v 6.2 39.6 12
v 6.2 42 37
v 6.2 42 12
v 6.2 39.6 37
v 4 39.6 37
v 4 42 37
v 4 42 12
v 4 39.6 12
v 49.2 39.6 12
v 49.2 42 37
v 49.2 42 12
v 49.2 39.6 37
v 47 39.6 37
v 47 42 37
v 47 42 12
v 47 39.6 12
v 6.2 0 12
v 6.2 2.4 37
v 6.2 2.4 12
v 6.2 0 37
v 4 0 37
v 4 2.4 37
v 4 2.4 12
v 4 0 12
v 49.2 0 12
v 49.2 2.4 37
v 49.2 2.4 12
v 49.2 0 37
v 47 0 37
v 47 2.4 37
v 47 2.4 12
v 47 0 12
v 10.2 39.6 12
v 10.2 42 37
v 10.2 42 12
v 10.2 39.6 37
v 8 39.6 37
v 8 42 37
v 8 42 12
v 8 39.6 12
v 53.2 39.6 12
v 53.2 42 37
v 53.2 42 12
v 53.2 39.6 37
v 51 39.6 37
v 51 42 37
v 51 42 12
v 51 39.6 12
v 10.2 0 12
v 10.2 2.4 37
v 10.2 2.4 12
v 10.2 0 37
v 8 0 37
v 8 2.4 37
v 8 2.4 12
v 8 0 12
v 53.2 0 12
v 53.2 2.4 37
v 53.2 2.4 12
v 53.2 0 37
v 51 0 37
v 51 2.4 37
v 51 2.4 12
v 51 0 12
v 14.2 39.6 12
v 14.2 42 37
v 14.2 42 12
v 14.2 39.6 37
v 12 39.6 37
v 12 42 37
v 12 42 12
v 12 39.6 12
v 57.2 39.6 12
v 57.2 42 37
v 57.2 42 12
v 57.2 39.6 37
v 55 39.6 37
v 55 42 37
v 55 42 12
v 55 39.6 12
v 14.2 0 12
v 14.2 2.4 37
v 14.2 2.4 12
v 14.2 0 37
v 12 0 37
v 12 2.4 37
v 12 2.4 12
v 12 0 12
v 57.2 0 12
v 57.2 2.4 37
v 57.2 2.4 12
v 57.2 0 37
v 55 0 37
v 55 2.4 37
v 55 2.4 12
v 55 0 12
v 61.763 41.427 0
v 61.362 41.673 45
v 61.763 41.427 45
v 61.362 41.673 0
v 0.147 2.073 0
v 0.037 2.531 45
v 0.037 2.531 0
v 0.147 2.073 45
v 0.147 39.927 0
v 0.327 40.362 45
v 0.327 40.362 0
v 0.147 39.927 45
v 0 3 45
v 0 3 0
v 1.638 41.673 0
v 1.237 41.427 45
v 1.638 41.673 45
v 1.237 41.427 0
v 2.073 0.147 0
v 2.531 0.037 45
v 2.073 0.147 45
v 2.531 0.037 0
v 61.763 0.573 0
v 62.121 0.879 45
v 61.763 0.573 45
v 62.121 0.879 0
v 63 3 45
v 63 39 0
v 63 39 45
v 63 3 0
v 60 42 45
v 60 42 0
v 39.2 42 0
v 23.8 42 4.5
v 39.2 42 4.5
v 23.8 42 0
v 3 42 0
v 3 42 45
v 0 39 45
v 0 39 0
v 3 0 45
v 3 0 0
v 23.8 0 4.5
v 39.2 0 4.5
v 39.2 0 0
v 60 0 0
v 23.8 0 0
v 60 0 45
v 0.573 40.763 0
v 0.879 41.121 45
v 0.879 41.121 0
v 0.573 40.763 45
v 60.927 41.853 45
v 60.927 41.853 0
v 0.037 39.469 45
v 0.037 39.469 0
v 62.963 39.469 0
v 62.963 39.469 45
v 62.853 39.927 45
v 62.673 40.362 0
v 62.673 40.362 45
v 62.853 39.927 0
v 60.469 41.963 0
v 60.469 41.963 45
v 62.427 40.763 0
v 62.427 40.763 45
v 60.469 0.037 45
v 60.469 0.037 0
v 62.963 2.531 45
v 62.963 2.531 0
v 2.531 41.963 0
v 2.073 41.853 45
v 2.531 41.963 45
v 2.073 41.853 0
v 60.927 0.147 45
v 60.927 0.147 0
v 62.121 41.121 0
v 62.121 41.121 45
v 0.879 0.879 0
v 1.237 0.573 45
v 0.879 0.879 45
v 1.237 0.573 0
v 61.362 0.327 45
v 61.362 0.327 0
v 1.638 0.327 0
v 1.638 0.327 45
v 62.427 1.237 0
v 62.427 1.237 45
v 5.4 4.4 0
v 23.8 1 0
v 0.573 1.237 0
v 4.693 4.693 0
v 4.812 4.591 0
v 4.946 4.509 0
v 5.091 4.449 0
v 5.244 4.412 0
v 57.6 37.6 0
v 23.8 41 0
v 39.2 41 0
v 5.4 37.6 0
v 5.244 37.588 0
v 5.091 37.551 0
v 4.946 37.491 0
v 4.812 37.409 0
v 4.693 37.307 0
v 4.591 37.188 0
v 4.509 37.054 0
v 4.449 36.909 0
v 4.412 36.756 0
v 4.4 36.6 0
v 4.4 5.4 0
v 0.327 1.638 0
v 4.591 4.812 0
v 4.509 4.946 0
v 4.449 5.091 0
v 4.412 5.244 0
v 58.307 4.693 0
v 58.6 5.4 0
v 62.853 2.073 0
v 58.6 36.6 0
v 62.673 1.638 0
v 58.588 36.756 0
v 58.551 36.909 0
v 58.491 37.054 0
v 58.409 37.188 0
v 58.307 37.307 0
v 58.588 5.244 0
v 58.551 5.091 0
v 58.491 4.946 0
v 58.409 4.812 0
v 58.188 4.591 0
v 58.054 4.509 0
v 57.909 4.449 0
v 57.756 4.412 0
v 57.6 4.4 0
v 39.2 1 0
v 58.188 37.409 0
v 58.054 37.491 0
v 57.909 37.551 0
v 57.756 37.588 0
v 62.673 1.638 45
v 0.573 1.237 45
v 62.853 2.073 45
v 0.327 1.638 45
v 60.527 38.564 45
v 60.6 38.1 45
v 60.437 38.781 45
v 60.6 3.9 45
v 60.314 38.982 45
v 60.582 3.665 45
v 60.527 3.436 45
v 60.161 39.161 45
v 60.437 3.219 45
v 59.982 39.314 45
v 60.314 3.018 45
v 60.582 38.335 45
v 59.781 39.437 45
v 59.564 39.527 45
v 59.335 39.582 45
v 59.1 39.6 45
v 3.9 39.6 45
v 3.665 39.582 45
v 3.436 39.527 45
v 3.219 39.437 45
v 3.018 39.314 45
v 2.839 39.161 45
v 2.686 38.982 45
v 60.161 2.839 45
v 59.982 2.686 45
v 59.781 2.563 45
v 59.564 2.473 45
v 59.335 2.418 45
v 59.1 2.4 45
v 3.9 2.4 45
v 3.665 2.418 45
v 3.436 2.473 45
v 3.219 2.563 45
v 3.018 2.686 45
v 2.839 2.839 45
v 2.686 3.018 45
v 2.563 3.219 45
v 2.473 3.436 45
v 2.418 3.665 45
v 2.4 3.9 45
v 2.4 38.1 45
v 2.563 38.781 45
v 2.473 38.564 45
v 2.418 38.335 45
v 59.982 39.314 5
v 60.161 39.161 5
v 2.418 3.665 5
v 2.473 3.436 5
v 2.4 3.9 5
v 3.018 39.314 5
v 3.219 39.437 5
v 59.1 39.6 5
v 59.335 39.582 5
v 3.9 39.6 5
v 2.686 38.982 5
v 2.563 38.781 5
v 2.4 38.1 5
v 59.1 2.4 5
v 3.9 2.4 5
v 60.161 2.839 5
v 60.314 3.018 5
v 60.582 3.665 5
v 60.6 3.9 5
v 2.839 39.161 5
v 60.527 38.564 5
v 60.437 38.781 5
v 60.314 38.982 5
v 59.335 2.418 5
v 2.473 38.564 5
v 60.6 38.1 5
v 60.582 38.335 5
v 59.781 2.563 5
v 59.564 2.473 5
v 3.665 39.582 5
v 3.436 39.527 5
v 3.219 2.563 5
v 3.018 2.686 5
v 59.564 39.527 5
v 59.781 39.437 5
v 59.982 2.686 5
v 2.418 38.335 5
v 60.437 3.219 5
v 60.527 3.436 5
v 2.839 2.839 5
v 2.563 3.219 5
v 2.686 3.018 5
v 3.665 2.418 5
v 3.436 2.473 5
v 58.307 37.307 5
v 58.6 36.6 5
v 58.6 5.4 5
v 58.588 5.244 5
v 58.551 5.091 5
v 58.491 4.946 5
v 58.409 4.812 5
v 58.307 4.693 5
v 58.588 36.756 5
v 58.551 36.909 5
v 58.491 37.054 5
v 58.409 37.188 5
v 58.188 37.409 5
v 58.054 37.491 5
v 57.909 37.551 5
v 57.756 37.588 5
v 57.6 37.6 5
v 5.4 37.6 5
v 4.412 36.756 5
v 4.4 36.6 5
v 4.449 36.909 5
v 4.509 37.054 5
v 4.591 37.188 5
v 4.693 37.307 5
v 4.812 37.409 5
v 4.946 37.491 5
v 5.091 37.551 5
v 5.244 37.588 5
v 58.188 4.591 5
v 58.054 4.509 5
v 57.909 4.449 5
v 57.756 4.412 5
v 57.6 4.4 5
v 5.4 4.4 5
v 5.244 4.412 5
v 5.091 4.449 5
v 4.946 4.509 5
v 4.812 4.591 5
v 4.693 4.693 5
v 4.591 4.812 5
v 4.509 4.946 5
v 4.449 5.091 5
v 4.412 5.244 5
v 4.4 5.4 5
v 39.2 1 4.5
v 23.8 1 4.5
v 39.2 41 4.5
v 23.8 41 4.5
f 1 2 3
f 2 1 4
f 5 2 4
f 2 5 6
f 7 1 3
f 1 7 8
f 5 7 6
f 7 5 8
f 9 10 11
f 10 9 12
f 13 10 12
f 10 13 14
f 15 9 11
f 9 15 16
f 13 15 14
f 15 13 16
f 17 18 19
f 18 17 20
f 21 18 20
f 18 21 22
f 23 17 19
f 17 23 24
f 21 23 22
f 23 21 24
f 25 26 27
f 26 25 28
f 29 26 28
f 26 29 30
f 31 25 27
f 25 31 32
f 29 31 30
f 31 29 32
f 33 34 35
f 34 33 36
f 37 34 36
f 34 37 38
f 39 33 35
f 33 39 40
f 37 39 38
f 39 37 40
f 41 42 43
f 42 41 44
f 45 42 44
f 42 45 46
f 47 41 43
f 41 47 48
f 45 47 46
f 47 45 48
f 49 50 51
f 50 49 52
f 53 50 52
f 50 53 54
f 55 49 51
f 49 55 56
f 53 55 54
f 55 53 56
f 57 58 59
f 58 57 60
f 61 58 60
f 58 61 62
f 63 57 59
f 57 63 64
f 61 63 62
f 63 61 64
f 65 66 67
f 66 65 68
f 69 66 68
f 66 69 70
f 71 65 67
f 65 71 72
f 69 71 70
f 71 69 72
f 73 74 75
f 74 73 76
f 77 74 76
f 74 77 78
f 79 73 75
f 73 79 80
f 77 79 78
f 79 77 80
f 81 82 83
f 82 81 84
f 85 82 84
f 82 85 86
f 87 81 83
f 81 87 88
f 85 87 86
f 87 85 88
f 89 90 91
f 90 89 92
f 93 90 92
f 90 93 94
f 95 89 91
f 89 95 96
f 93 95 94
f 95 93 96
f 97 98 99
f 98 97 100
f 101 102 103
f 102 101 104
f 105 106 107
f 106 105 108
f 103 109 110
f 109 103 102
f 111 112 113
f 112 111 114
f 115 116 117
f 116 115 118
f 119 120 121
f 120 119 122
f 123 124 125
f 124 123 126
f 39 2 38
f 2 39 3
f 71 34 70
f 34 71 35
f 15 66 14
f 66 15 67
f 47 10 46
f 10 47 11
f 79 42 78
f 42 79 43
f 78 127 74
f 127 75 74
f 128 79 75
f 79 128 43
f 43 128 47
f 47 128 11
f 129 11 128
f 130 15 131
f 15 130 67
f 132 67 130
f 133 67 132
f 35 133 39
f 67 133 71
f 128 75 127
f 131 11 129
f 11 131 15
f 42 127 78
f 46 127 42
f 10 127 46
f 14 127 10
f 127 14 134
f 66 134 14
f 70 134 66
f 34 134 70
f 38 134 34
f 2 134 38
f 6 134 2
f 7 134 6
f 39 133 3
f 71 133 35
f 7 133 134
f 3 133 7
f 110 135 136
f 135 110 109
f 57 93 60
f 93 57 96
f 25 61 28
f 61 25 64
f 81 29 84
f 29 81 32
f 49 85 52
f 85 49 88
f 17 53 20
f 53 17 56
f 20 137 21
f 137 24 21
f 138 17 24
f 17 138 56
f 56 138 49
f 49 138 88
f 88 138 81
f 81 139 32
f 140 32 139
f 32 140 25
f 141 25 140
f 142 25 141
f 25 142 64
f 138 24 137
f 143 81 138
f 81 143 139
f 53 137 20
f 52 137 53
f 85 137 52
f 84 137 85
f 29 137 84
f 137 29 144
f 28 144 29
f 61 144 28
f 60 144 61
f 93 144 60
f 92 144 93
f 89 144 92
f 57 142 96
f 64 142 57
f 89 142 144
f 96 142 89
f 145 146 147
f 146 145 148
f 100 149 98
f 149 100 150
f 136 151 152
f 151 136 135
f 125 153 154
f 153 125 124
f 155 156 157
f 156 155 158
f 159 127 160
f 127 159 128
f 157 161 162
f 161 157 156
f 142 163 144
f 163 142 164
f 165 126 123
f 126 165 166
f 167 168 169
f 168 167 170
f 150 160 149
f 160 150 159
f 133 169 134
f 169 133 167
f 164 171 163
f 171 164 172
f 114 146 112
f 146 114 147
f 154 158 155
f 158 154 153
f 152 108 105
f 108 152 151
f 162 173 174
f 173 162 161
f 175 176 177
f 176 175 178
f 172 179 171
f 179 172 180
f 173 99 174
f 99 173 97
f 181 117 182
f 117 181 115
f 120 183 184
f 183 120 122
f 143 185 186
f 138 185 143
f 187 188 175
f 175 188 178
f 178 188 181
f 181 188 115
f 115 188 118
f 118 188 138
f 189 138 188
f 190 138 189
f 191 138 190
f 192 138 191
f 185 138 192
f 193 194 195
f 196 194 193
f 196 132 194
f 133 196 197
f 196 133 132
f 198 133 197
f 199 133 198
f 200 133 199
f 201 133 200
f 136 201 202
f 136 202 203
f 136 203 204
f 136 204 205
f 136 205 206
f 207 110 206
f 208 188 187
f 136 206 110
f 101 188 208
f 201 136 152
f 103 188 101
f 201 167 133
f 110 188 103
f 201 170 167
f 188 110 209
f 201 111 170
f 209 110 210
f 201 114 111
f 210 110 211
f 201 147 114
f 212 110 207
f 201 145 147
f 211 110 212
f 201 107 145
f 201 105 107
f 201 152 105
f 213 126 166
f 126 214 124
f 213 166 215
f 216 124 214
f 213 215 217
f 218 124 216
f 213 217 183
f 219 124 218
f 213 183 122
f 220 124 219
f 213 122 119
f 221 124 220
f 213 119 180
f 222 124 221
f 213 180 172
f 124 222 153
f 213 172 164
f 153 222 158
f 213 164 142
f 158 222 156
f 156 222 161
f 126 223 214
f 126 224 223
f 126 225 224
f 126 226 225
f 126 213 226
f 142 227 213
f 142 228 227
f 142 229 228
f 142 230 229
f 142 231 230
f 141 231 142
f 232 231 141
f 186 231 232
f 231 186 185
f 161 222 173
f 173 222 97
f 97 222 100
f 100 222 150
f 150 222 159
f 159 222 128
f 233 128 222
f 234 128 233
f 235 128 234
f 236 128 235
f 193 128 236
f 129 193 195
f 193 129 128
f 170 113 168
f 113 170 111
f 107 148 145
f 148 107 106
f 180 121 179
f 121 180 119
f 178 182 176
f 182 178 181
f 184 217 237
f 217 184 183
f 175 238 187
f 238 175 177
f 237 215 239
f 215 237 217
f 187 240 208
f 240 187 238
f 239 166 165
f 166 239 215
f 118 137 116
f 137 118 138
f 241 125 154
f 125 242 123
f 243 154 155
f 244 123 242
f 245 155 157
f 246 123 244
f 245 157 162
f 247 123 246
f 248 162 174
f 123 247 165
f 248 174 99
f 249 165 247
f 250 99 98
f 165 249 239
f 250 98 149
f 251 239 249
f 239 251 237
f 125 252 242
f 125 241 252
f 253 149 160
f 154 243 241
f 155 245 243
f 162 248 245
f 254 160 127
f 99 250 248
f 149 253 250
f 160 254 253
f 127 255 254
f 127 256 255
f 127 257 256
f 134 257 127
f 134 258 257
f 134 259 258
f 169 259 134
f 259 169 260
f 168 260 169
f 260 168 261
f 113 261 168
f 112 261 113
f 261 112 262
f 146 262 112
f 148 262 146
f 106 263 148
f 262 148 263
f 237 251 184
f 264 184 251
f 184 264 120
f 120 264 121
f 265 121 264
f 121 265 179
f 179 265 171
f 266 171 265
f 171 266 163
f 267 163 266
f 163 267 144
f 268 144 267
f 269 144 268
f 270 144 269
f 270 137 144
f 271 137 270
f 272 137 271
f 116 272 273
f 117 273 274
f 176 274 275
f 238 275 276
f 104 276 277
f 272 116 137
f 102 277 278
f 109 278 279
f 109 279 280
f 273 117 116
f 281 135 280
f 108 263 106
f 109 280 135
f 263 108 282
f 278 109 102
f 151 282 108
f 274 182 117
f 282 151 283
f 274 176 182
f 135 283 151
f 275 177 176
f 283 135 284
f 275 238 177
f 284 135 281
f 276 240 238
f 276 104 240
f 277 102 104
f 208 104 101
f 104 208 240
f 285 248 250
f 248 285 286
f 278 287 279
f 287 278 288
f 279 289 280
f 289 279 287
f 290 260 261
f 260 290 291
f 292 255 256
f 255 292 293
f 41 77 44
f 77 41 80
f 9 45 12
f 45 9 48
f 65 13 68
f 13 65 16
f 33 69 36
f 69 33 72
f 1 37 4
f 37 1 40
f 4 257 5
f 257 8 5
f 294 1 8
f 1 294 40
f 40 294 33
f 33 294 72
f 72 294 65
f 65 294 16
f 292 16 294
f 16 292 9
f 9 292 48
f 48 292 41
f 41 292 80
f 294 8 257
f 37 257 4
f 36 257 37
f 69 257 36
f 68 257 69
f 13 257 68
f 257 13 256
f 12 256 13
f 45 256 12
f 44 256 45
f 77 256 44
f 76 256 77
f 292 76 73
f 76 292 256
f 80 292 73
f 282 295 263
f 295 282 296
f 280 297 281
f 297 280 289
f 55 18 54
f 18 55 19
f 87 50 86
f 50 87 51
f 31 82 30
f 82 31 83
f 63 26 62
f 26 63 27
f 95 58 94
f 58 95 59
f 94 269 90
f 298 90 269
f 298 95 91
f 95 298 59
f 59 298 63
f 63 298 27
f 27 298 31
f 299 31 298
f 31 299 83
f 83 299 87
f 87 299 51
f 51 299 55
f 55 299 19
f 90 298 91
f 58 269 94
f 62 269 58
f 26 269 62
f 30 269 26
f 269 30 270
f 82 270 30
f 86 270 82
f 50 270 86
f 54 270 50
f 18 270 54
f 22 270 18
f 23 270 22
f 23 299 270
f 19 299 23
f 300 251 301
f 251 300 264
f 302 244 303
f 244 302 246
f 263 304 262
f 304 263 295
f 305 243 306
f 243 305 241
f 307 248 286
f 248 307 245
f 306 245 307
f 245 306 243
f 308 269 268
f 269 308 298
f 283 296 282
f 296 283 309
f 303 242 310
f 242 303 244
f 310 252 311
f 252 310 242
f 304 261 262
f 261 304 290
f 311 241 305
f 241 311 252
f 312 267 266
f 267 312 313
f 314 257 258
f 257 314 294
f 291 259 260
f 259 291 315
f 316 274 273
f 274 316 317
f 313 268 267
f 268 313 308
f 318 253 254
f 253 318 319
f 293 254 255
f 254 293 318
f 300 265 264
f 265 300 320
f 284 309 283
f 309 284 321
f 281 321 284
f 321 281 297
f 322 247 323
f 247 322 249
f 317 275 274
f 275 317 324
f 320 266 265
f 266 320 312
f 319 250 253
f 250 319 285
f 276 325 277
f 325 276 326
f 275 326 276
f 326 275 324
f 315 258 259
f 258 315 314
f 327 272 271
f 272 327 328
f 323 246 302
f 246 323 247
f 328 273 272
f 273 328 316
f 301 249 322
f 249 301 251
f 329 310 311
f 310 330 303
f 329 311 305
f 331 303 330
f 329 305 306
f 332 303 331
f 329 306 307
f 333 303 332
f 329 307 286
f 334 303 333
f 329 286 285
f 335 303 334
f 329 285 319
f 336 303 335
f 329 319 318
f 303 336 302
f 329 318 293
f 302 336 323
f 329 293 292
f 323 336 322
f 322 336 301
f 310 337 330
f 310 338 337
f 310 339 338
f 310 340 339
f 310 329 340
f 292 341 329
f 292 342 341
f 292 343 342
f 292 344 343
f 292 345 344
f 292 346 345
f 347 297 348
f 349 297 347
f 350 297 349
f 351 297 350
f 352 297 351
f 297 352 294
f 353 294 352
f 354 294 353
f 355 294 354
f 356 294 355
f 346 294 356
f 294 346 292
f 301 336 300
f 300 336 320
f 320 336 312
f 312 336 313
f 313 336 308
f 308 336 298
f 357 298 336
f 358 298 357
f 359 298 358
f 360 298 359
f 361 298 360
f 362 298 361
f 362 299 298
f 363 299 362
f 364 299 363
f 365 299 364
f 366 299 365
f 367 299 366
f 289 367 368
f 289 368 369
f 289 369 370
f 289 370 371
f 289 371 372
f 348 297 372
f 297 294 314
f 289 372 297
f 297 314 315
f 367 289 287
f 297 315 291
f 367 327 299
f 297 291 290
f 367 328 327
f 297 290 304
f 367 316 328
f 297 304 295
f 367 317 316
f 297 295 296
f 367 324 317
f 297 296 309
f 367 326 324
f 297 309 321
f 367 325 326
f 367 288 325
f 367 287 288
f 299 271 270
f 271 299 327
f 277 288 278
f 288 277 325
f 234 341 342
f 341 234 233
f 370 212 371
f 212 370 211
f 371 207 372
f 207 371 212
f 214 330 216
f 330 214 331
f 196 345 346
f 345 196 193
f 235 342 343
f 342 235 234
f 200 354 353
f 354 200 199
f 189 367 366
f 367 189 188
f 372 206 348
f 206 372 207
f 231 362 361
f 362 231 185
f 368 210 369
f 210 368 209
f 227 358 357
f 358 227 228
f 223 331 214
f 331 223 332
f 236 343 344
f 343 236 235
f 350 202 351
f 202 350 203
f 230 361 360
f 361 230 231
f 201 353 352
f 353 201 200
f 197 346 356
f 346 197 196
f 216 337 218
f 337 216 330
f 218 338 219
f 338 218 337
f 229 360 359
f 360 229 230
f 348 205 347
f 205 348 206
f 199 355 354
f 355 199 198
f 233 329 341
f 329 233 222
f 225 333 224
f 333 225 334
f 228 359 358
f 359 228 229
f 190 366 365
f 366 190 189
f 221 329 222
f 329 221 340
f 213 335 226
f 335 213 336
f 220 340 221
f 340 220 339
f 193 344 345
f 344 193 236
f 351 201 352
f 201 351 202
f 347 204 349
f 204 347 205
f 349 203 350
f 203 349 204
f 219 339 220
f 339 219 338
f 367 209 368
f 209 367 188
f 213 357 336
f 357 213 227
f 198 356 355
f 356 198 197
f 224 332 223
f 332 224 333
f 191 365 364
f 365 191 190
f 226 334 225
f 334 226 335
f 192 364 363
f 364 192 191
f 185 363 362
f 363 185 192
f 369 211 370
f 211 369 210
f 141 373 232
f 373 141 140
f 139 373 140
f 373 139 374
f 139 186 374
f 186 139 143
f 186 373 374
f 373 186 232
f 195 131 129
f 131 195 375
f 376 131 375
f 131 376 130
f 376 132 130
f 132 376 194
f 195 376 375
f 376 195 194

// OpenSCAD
// ============================================================
// MODULE HORLOGE / INCLINOMÈTRE SUZUKI SAMURAI SJ413
// Pièce 2/2 : CORPS DU BOÎTIER ARRIÈRE — 02_boitier_corps.scad
// Carte : ESP32-S3 avec écran IPS 1.9" intégré (170x320, ST7789)
// ============================================================
// IMPORTANT — repère PARTAGÉ avec 01_facade_samurai.scad :
// (0,0) = coin bas-gauche de la DÉCOUPE DU TABLEAU DE BORD.
// Ce fichier est construit directement dans ce repère (pas de
// débord à soustraire). Les positions des encoches ci-dessous
// utilisent les MÊMES variables "x_patte_trou / largeur_patte /
// longueur_patte" que la façade — gardez-les synchronisées si
// vous modifiez l'une ou l'autre pièce.
// ============================================================

$fn = 40;

// --- Dimensions (doivent rester identiques à celles de la façade) ---
largeur_trou       = 63.0;
hauteur_trou       = 42.0;
profondeur_boitier = 45.0;
epaisseur_paroi    = 2.4;

// --- Étagère interne (ledge) qui retient le PCB contre la vitre ---
// Sur les premiers "profondeur_ledge" mm, l'ouverture est réduite de
// epaisseur_ledge en plus de l'épaisseur de paroi normale : le PCB,
// glissé depuis l'avant, bute sur ce rebord et s'arrête net derrière
// la fenêtre de l'écran.
profondeur_ledge = 5.0;
epaisseur_ledge  = 2.0;

// --- Port USB-C (accès arrière, pour prog./alimentation directe) ---
largeur_usb = 12.0;
hauteur_usb = 7.0;

// --- Encoches d'assemblage (DOIVENT matcher la façade) ---
largeur_patte   = 15.0;
epaisseur_patte = 1.9;
longueur_patte  = 4.0;                              // reste dans la zone d'étagère (< profondeur_ledge)
x_patte_trou    = (largeur_trou - largeur_patte)/2;  // 24.0 — centré, identique à la façade
jeu_largeur     = 0.4;                               // jeu latéral autour de la patte

module rectangle_arrondi(l, h, r) {
    hull() {
        translate([r, r]) circle(r=r);
        translate([l-r, r]) circle(r=r);
        translate([l-r, h-r]) circle(r=r);
        translate([r, h-r]) circle(r=r);
    }
}

module boitier_corps() {
    difference() {
        // Corps principal qui s'enfonce dans le tableau de bord
        linear_extrude(height = profondeur_boitier)
            rectangle_arrondi(largeur_trou, hauteur_trou, 3.0);

        // --- Cavité principale (profonde), paroi standard ---
        translate([epaisseur_paroi, epaisseur_paroi, profondeur_ledge])
            linear_extrude(height = profondeur_boitier - profondeur_ledge + 1)
                rectangle_arrondi(
                    largeur_trou - 2*epaisseur_paroi,
                    hauteur_trou - 2*epaisseur_paroi, 1.5);

        // --- Cavité avant (étagère), ouverture réduite pour retenir le PCB ---
        translate([epaisseur_paroi + epaisseur_ledge, epaisseur_paroi + epaisseur_ledge, -1])
            linear_extrude(height = profondeur_ledge + 1)
                rectangle_arrondi(
                    largeur_trou - 2*(epaisseur_paroi + epaisseur_ledge),
                    hauteur_trou - 2*(epaisseur_paroi + epaisseur_ledge), 1.0);

        // Accès port USB-C au dos (centré, aligné sur le connecteur de la carte)
        translate([largeur_trou/2 - largeur_usb/2, 8.0, profondeur_boitier - 5.0])
            cube([largeur_usb, hauteur_usb, 10.0]);

        // Passage des câbles d'alimentation 12V / GND (régulateur -> faisceau)
        translate([largeur_trou/2 - 8.0, hauteur_trou - 14.0, profondeur_boitier - 5.0])
            cube([16.0, 8.0, 10.0]);

        // --- Encoche haute (reçoit la patte haute de la façade) ---
        // Traverse toute l'épaisseur de la paroi (haut) pour un ajustement
        // par friction — la façade déborde du trou et masque cette fente.
        translate([x_patte_trou - jeu_largeur/2, -2, -0.5])
            cube([largeur_patte + jeu_largeur, 3.0, longueur_patte + 1]);

        // --- Encoche basse (reçoit la patte basse de la façade) ---
        translate([x_patte_trou - jeu_largeur/2, hauteur_trou - 1.0, -0.5])
            cube([largeur_patte + jeu_largeur, 3.0, longueur_patte + 1]);

        // --- Fentes de refroidissement pour l'ESP32-S3 ---
        // En dehors de la zone centrale des encoches (x 22 à 41) et de
        // la zone d'étagère avant : positionnées sur les côtés, plus
        // profondes dans le boîtier (z > 12).
        for (i = [0:2]) {
            translate([4 + i*4, hauteur_trou - epaisseur_paroi - 1, 12])
                cube([2.2, epaisseur_paroi + 2, 25]);
            translate([largeur_trou - 16 + i*4, hauteur_trou - epaisseur_paroi - 1, 12])
                cube([2.2, epaisseur_paroi + 2, 25]);
            translate([4 + i*4, -1, 12])
                cube([2.2, epaisseur_paroi + 2, 25]);
            translate([largeur_trou - 16 + i*4, -1, 12])
                cube([2.2, epaisseur_paroi + 2, 25]);
        }
    }
}

boitier_corps();
